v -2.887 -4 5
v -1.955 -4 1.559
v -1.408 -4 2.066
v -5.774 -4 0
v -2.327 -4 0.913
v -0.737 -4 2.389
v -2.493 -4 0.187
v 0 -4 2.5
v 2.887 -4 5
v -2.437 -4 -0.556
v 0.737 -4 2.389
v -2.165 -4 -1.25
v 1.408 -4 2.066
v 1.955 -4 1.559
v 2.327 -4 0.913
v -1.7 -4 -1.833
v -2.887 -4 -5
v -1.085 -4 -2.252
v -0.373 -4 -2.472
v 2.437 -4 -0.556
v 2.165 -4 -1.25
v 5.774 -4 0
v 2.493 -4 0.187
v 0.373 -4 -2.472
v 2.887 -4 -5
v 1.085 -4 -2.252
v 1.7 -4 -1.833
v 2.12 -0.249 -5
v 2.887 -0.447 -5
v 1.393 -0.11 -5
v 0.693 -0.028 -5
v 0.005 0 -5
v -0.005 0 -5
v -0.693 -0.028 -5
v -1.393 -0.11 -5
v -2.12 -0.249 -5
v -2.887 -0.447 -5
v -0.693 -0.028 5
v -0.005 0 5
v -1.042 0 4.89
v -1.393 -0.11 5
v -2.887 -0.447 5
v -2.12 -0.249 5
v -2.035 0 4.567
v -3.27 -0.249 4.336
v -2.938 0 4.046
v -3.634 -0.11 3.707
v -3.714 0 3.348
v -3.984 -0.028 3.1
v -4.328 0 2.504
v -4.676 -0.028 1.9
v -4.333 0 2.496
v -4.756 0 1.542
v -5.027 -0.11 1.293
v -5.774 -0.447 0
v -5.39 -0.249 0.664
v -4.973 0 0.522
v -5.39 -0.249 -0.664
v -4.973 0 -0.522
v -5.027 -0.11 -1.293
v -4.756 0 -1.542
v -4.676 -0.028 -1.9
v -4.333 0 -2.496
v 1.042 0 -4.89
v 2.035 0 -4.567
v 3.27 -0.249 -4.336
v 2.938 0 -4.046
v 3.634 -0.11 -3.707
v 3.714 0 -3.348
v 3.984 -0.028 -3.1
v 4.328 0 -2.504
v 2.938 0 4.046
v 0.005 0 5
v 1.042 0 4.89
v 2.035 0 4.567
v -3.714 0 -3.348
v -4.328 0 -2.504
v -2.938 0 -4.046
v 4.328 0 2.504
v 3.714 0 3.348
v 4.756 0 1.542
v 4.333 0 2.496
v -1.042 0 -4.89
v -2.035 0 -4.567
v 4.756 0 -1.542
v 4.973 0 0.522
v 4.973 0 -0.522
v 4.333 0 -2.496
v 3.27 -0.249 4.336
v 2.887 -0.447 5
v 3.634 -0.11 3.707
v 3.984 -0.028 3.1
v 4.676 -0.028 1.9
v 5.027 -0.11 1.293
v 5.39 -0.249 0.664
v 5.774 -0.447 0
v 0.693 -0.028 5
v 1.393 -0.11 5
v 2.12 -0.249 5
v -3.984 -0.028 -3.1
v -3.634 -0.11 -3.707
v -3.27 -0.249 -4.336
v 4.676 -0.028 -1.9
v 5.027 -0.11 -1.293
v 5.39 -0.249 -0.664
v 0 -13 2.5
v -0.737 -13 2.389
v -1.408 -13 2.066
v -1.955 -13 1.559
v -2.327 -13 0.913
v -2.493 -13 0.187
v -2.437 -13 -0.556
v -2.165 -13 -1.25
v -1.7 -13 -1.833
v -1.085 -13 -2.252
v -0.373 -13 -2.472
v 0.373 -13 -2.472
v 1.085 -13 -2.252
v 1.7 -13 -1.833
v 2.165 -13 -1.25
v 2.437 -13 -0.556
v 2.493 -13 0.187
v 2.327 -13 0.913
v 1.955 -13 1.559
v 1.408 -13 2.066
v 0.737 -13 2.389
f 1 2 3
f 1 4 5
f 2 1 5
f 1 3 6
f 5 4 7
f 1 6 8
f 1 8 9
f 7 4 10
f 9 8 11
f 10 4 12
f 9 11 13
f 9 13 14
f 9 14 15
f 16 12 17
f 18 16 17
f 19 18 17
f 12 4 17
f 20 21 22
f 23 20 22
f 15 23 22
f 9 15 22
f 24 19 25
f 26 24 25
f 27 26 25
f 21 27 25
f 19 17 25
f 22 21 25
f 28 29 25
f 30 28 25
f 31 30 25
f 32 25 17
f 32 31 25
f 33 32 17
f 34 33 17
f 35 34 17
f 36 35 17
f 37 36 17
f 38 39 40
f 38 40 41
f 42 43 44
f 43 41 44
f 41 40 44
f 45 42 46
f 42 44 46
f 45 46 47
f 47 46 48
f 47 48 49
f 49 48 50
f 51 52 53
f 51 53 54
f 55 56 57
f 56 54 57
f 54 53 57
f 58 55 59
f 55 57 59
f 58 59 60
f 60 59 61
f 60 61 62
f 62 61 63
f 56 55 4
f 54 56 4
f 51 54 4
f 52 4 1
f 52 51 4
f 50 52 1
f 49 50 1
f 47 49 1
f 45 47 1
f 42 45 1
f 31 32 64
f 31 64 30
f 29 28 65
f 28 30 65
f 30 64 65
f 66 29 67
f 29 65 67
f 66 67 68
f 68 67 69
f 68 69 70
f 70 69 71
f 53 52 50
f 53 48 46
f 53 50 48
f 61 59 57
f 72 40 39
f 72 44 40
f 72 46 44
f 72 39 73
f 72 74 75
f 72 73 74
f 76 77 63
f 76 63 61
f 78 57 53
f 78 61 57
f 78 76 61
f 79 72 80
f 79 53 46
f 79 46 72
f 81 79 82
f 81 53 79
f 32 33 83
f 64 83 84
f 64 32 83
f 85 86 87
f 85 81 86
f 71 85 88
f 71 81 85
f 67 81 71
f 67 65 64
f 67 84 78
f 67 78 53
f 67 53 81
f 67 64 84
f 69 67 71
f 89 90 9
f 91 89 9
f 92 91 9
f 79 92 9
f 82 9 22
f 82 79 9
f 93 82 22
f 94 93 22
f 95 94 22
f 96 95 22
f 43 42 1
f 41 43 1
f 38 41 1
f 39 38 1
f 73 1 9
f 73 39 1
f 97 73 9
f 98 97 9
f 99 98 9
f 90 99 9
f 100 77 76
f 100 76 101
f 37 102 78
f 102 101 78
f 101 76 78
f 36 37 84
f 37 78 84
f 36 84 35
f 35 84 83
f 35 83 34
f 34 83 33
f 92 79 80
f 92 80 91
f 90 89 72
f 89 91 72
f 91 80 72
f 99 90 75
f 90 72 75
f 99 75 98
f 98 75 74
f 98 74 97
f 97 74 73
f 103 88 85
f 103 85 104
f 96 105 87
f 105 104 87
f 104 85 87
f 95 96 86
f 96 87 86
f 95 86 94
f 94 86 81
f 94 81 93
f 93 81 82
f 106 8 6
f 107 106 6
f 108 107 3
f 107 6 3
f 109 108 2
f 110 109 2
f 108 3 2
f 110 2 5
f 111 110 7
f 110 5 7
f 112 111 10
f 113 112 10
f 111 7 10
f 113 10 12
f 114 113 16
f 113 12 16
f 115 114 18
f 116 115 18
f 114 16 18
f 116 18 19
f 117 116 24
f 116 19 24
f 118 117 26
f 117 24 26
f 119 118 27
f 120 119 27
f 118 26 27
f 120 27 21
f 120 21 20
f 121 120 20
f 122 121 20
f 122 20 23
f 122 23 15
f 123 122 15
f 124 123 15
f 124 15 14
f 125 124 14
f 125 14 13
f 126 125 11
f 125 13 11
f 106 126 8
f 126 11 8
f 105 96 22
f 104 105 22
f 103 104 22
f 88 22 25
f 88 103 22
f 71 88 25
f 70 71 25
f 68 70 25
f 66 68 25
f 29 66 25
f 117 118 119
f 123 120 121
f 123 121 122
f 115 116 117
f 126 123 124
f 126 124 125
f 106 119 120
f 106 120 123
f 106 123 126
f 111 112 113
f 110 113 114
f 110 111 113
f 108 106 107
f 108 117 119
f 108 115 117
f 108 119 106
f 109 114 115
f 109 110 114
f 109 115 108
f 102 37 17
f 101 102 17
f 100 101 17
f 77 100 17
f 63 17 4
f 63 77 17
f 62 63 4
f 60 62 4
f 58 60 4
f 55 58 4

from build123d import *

# Parameters (mm, degrees)
BOSS_EXTRUDE1_DEPTH = 4
SKETCH4_R           = 2.5
BOSS_EXTRUDE2_DEPTH = 9


with BuildPart() as part:
    # Sketch1 → Boss-Extrude1 (new body)
    with BuildSketch(Plane(origin=(0, 0, 0), x_dir=(1, 0, 0), z_dir=(0, 1, 0))):
        Polygon((5.773502692, 0), (2.886751346, 5), (-2.886751346, 5), (-5.773502692, 0), (-2.886751346, -5), (2.886751346, -5), align=None)
    extrude(amount=-BOSS_EXTRUDE1_DEPTH)

    # Sketch3 → Cut-Revolve1 (revolve, cut)
    with BuildSketch(Plane.XY):
        Polygon((5.000002459, 0), (5.773502692, 0), (5.773502692, -0.446580568), align=None)
    revolve(axis=Axis((0, 1.337001122, 0), (0, -1, 0)), mode=Mode.SUBTRACT)

    # Sketch4 → Boss-Extrude2 (add)
    with BuildSketch(Plane.XZ.offset(4)):
        with Locations(Location((0, 0, 0), (0, 0, 90))):
            Circle(SKETCH4_R)
    extrude(amount=BOSS_EXTRUDE2_DEPTH)


solid = part.part
